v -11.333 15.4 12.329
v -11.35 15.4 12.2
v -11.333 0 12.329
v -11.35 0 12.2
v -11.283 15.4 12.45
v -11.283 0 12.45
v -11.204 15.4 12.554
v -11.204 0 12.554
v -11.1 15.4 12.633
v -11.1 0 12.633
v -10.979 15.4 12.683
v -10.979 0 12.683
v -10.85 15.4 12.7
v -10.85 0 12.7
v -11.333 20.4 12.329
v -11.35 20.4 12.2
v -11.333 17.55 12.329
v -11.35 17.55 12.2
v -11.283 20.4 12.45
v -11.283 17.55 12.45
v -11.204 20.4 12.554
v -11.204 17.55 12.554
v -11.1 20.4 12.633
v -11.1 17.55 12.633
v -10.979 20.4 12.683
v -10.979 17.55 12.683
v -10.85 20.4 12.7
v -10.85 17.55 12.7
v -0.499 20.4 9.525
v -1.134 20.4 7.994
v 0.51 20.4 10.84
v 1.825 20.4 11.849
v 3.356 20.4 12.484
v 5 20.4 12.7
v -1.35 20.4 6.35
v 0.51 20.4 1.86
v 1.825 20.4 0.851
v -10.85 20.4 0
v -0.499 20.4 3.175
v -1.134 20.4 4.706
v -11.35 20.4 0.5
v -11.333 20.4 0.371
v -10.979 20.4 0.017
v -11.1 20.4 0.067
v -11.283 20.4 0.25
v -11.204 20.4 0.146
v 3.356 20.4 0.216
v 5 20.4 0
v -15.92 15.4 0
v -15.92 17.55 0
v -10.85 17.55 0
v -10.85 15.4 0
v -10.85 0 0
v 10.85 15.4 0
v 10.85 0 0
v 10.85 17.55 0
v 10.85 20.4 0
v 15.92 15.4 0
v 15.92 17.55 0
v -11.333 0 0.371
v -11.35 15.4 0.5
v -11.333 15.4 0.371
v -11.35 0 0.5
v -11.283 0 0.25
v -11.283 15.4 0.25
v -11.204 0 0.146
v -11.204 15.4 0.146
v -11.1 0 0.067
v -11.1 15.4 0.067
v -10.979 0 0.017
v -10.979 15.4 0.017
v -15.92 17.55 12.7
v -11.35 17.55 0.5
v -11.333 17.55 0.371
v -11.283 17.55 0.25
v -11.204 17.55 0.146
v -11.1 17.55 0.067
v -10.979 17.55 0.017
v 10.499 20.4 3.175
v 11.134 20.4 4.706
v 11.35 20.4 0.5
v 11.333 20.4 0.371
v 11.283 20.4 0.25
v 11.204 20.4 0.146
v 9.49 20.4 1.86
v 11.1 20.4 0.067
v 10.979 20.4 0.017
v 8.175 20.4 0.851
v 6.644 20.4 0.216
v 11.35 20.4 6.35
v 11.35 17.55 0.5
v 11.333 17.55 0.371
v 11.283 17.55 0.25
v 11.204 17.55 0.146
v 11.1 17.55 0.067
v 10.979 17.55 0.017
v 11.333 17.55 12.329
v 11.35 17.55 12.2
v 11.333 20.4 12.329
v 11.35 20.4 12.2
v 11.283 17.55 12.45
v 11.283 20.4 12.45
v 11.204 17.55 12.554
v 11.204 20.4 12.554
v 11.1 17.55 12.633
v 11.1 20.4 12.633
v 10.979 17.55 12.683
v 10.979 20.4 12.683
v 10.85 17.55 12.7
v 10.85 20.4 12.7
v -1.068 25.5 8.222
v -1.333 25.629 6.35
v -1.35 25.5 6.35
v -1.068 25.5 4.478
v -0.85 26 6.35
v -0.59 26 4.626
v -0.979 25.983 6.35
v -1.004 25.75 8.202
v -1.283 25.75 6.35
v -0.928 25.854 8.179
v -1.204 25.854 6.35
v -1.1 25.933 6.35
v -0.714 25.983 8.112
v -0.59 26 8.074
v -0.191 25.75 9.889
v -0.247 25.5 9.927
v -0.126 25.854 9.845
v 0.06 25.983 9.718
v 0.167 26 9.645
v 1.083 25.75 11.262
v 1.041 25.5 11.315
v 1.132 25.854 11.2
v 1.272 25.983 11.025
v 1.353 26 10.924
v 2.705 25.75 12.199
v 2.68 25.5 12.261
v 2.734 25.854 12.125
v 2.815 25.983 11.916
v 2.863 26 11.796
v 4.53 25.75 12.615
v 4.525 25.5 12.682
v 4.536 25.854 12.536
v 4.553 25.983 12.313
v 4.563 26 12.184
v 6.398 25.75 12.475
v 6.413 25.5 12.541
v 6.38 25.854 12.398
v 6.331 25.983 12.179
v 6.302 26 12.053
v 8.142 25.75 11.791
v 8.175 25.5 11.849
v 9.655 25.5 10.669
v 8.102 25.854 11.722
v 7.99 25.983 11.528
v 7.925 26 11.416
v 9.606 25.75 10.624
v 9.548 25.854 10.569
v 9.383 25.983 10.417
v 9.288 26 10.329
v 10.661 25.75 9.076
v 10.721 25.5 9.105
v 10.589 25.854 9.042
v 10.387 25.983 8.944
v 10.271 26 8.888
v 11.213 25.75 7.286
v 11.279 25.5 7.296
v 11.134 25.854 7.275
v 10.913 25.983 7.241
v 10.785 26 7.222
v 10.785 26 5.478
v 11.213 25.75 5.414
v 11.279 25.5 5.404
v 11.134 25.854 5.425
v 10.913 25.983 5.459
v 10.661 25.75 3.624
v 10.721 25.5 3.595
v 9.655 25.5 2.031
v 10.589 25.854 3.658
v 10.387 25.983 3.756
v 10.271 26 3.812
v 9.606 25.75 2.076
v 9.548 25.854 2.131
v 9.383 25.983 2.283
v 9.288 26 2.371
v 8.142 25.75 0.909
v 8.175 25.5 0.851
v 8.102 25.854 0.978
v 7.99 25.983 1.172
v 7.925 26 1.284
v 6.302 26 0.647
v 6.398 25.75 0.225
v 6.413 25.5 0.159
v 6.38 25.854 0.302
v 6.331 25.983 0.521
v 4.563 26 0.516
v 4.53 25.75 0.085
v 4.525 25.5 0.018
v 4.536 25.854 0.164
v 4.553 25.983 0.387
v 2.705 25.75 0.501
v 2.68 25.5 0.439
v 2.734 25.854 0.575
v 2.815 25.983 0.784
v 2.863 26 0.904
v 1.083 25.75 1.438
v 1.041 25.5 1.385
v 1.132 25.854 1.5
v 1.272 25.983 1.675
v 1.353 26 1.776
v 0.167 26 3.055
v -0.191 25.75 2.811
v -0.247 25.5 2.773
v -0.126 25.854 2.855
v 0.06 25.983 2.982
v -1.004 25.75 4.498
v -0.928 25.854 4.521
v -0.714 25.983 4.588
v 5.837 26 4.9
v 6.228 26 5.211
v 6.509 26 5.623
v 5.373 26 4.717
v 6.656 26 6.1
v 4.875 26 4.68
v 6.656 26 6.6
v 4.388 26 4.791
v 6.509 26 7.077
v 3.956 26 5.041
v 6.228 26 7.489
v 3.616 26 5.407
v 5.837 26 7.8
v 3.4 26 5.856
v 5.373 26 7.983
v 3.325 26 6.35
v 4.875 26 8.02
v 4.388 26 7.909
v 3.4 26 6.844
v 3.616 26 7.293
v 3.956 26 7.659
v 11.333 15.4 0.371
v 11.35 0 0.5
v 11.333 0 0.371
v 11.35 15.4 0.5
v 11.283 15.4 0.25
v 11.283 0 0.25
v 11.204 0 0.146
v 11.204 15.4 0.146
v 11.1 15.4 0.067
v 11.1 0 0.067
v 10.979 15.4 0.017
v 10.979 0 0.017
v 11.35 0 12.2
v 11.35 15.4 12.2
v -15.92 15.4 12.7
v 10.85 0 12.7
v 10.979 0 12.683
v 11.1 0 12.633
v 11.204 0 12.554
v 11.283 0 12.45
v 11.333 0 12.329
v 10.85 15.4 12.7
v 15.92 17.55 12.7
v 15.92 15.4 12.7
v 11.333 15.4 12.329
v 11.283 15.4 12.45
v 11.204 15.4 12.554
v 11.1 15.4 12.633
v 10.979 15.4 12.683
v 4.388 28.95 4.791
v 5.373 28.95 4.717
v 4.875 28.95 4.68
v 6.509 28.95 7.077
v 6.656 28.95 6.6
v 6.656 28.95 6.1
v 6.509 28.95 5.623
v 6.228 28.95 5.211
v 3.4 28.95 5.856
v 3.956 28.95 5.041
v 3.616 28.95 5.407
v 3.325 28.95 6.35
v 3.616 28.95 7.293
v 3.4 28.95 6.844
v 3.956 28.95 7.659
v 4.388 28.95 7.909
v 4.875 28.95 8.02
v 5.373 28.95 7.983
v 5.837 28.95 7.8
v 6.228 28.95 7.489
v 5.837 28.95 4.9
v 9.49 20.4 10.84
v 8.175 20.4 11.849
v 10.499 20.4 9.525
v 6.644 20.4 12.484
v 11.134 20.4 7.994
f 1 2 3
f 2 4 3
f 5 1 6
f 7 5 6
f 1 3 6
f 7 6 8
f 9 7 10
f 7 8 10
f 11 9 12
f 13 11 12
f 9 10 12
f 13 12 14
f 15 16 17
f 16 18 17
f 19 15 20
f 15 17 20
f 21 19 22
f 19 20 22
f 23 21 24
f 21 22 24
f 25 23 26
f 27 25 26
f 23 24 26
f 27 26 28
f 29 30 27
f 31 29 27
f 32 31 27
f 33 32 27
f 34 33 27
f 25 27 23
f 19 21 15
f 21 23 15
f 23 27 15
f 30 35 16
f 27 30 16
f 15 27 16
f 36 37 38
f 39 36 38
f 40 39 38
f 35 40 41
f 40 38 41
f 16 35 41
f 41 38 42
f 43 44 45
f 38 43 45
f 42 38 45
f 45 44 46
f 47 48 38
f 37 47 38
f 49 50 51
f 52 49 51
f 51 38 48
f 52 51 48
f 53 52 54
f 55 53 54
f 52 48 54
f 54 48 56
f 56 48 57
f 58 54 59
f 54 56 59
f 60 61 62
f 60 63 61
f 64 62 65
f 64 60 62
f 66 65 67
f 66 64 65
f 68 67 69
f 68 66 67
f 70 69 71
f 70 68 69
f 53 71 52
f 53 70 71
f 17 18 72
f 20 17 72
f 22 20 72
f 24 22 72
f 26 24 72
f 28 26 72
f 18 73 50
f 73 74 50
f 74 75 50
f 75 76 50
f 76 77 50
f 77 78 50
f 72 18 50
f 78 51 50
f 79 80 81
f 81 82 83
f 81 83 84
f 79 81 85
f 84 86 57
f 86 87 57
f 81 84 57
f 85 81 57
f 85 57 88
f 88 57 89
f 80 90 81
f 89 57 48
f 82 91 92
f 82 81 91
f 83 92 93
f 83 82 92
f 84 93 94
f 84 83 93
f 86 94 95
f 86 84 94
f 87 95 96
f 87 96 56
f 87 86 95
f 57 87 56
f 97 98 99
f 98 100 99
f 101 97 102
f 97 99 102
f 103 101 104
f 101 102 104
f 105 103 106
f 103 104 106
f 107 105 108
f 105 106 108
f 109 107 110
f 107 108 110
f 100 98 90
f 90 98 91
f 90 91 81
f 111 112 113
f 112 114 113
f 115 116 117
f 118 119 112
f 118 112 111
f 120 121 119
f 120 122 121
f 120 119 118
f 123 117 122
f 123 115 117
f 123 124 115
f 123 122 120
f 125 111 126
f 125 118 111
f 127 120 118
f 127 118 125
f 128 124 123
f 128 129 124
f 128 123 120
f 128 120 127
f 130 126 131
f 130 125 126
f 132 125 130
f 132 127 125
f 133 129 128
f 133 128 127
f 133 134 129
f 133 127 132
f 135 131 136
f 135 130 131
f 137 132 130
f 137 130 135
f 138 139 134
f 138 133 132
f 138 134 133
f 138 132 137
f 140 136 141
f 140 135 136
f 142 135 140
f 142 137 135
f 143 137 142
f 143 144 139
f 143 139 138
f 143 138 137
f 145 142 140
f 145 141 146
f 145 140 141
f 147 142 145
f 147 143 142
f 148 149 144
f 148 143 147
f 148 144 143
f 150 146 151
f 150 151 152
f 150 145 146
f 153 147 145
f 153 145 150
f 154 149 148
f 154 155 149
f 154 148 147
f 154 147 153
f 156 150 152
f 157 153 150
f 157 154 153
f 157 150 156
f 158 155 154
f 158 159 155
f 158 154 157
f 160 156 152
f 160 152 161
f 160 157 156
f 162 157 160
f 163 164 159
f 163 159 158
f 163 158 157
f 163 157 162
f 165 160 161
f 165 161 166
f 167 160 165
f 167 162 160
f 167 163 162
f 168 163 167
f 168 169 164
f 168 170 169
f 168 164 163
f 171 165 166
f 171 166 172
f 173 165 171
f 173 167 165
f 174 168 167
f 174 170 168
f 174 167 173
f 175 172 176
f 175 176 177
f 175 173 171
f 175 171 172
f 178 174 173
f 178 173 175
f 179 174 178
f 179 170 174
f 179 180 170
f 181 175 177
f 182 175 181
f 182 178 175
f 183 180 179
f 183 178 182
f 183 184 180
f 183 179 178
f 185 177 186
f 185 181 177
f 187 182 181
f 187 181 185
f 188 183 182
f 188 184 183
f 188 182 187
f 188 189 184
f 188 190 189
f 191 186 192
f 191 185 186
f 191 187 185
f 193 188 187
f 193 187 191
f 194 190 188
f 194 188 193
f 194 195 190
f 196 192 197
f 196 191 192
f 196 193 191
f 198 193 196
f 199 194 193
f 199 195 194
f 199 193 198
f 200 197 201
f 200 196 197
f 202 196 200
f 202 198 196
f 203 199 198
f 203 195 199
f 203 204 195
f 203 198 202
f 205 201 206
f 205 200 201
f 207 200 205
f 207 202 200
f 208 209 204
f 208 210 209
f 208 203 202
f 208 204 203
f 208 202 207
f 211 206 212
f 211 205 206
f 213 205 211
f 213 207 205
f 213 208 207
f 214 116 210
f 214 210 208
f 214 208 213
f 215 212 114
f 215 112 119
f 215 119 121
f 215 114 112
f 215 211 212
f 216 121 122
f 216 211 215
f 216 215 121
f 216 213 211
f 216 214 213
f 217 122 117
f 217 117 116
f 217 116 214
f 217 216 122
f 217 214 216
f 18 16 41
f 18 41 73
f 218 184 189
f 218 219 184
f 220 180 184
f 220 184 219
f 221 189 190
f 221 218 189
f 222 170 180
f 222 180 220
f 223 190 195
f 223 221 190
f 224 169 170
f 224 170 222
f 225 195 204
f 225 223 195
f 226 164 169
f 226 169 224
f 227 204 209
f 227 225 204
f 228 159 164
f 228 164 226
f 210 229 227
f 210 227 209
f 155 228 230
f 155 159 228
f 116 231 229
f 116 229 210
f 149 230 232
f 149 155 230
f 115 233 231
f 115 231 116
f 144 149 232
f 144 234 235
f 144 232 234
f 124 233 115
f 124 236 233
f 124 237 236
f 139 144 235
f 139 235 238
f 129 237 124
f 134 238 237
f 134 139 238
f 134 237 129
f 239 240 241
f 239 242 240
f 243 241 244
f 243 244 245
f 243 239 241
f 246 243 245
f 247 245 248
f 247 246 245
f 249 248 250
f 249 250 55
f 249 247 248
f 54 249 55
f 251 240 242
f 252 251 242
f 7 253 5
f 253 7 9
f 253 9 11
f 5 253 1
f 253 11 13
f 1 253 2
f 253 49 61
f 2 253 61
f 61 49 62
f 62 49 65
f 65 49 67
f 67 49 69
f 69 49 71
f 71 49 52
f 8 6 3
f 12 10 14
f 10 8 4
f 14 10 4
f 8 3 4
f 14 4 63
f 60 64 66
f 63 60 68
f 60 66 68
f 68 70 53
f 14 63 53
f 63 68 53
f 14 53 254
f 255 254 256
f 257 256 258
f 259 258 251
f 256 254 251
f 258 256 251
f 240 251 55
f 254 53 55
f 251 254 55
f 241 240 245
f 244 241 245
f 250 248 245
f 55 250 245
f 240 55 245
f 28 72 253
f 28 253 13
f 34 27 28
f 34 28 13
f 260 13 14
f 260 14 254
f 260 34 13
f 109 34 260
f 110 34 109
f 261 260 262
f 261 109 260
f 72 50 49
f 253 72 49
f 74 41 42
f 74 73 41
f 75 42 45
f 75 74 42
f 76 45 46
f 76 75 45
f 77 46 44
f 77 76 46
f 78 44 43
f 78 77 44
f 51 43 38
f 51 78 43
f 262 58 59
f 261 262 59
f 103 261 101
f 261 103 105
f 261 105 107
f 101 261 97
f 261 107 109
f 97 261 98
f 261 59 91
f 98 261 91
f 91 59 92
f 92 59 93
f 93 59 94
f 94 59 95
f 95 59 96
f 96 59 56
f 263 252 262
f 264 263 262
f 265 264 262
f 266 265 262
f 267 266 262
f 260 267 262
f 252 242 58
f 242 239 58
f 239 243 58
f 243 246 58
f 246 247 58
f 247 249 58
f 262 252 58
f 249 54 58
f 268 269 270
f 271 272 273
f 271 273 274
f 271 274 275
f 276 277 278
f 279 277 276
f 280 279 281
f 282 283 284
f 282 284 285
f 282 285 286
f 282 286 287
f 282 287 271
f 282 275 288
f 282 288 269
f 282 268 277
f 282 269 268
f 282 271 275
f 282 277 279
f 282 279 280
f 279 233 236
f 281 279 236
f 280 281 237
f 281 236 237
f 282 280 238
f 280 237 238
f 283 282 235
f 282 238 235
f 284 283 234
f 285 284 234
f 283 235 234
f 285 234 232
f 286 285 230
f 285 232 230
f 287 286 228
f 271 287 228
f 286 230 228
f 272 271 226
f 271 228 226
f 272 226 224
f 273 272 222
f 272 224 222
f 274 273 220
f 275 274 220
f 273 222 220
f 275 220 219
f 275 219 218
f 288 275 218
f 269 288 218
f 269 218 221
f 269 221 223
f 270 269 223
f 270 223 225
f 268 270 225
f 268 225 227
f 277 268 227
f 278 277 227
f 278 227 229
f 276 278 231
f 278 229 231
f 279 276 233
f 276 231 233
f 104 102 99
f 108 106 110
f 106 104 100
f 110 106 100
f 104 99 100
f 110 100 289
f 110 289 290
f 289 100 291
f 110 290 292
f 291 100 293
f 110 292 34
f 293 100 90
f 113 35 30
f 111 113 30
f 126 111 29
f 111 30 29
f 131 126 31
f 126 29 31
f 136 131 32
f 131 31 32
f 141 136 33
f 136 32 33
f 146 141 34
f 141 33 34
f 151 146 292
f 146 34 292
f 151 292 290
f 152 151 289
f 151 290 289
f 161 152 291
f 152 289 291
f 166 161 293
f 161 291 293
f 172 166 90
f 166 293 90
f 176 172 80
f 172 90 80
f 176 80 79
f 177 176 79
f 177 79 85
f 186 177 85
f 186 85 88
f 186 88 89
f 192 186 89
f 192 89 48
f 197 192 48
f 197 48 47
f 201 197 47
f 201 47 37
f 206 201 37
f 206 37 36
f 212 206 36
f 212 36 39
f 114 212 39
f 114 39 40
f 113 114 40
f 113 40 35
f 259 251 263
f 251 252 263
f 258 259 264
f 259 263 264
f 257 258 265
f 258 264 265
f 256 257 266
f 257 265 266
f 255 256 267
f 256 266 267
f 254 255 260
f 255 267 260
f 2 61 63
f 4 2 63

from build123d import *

# Parameters (mm, degrees)
F3_DEPTH  = 12.7
F4_R      = 0.5
F6_R      = 6.35
F7_DEPTH  = 5.6
F8_R      = 0.5
F9_R      = 1.6747204535
F10_DEPTH = 2.95


with BuildPart() as f3:
    # F2 (on Top) → F3 (new body)
    with BuildSketch(Plane.XY):
        Polygon((11.35, 20.4), (-11.35, 20.4), (-11.35, 17.55), (-15.92, 17.55), (-15.92, 15.4), (-11.35, 15.4), (-11.35, 0), (11.35, 0), (11.35, 15.4), (15.92, 15.4), (15.92, 17.55), (11.35, 17.55), align=None)
    extrude(amount=F3_DEPTH)

    # F4
    f4_edges = [f3.edges().sort_by_distance(p)[0] for p in [
        (11.35, 7.7, 12.7),
        (11.35, 18.975, 12.7),
        (11.35, 18.975, 0),
        (11.35, 7.7, 0),
        (-11.35, 18.975, 12.7),
        (-11.35, 7.7, 12.7),
        (-11.35, 18.975, 0),
        (-11.35, 7.7, 0),
    ]]
    fillet(f4_edges, radius=F4_R)

    # F6 (on offset) → F7 (join)
    with BuildSketch(Plane(origin=(0, 20.4, 0), x_dir=(-1, 0, 0), z_dir=(0, 1, 0))):
        with Locations((-5, 6.35)):
            Circle(F6_R)
    extrude(amount=F7_DEPTH)

    # F8
    f8_edges = [f3.edges().sort_by_distance(p)[0] for p in [
        (11.35, 26, 6.35),
    ]]
    fillet(f8_edges, radius=F8_R)

    # F9 (on face) → F10 (join)
    with BuildSketch(Plane(origin=(0, 26, 0), x_dir=(-1, 0, 0), z_dir=(0, 1, 0))):
        with Locations((-5, 6.35)):
            Circle(F9_R)
    extrude(amount=F10_DEPTH)


solid = f3.part
